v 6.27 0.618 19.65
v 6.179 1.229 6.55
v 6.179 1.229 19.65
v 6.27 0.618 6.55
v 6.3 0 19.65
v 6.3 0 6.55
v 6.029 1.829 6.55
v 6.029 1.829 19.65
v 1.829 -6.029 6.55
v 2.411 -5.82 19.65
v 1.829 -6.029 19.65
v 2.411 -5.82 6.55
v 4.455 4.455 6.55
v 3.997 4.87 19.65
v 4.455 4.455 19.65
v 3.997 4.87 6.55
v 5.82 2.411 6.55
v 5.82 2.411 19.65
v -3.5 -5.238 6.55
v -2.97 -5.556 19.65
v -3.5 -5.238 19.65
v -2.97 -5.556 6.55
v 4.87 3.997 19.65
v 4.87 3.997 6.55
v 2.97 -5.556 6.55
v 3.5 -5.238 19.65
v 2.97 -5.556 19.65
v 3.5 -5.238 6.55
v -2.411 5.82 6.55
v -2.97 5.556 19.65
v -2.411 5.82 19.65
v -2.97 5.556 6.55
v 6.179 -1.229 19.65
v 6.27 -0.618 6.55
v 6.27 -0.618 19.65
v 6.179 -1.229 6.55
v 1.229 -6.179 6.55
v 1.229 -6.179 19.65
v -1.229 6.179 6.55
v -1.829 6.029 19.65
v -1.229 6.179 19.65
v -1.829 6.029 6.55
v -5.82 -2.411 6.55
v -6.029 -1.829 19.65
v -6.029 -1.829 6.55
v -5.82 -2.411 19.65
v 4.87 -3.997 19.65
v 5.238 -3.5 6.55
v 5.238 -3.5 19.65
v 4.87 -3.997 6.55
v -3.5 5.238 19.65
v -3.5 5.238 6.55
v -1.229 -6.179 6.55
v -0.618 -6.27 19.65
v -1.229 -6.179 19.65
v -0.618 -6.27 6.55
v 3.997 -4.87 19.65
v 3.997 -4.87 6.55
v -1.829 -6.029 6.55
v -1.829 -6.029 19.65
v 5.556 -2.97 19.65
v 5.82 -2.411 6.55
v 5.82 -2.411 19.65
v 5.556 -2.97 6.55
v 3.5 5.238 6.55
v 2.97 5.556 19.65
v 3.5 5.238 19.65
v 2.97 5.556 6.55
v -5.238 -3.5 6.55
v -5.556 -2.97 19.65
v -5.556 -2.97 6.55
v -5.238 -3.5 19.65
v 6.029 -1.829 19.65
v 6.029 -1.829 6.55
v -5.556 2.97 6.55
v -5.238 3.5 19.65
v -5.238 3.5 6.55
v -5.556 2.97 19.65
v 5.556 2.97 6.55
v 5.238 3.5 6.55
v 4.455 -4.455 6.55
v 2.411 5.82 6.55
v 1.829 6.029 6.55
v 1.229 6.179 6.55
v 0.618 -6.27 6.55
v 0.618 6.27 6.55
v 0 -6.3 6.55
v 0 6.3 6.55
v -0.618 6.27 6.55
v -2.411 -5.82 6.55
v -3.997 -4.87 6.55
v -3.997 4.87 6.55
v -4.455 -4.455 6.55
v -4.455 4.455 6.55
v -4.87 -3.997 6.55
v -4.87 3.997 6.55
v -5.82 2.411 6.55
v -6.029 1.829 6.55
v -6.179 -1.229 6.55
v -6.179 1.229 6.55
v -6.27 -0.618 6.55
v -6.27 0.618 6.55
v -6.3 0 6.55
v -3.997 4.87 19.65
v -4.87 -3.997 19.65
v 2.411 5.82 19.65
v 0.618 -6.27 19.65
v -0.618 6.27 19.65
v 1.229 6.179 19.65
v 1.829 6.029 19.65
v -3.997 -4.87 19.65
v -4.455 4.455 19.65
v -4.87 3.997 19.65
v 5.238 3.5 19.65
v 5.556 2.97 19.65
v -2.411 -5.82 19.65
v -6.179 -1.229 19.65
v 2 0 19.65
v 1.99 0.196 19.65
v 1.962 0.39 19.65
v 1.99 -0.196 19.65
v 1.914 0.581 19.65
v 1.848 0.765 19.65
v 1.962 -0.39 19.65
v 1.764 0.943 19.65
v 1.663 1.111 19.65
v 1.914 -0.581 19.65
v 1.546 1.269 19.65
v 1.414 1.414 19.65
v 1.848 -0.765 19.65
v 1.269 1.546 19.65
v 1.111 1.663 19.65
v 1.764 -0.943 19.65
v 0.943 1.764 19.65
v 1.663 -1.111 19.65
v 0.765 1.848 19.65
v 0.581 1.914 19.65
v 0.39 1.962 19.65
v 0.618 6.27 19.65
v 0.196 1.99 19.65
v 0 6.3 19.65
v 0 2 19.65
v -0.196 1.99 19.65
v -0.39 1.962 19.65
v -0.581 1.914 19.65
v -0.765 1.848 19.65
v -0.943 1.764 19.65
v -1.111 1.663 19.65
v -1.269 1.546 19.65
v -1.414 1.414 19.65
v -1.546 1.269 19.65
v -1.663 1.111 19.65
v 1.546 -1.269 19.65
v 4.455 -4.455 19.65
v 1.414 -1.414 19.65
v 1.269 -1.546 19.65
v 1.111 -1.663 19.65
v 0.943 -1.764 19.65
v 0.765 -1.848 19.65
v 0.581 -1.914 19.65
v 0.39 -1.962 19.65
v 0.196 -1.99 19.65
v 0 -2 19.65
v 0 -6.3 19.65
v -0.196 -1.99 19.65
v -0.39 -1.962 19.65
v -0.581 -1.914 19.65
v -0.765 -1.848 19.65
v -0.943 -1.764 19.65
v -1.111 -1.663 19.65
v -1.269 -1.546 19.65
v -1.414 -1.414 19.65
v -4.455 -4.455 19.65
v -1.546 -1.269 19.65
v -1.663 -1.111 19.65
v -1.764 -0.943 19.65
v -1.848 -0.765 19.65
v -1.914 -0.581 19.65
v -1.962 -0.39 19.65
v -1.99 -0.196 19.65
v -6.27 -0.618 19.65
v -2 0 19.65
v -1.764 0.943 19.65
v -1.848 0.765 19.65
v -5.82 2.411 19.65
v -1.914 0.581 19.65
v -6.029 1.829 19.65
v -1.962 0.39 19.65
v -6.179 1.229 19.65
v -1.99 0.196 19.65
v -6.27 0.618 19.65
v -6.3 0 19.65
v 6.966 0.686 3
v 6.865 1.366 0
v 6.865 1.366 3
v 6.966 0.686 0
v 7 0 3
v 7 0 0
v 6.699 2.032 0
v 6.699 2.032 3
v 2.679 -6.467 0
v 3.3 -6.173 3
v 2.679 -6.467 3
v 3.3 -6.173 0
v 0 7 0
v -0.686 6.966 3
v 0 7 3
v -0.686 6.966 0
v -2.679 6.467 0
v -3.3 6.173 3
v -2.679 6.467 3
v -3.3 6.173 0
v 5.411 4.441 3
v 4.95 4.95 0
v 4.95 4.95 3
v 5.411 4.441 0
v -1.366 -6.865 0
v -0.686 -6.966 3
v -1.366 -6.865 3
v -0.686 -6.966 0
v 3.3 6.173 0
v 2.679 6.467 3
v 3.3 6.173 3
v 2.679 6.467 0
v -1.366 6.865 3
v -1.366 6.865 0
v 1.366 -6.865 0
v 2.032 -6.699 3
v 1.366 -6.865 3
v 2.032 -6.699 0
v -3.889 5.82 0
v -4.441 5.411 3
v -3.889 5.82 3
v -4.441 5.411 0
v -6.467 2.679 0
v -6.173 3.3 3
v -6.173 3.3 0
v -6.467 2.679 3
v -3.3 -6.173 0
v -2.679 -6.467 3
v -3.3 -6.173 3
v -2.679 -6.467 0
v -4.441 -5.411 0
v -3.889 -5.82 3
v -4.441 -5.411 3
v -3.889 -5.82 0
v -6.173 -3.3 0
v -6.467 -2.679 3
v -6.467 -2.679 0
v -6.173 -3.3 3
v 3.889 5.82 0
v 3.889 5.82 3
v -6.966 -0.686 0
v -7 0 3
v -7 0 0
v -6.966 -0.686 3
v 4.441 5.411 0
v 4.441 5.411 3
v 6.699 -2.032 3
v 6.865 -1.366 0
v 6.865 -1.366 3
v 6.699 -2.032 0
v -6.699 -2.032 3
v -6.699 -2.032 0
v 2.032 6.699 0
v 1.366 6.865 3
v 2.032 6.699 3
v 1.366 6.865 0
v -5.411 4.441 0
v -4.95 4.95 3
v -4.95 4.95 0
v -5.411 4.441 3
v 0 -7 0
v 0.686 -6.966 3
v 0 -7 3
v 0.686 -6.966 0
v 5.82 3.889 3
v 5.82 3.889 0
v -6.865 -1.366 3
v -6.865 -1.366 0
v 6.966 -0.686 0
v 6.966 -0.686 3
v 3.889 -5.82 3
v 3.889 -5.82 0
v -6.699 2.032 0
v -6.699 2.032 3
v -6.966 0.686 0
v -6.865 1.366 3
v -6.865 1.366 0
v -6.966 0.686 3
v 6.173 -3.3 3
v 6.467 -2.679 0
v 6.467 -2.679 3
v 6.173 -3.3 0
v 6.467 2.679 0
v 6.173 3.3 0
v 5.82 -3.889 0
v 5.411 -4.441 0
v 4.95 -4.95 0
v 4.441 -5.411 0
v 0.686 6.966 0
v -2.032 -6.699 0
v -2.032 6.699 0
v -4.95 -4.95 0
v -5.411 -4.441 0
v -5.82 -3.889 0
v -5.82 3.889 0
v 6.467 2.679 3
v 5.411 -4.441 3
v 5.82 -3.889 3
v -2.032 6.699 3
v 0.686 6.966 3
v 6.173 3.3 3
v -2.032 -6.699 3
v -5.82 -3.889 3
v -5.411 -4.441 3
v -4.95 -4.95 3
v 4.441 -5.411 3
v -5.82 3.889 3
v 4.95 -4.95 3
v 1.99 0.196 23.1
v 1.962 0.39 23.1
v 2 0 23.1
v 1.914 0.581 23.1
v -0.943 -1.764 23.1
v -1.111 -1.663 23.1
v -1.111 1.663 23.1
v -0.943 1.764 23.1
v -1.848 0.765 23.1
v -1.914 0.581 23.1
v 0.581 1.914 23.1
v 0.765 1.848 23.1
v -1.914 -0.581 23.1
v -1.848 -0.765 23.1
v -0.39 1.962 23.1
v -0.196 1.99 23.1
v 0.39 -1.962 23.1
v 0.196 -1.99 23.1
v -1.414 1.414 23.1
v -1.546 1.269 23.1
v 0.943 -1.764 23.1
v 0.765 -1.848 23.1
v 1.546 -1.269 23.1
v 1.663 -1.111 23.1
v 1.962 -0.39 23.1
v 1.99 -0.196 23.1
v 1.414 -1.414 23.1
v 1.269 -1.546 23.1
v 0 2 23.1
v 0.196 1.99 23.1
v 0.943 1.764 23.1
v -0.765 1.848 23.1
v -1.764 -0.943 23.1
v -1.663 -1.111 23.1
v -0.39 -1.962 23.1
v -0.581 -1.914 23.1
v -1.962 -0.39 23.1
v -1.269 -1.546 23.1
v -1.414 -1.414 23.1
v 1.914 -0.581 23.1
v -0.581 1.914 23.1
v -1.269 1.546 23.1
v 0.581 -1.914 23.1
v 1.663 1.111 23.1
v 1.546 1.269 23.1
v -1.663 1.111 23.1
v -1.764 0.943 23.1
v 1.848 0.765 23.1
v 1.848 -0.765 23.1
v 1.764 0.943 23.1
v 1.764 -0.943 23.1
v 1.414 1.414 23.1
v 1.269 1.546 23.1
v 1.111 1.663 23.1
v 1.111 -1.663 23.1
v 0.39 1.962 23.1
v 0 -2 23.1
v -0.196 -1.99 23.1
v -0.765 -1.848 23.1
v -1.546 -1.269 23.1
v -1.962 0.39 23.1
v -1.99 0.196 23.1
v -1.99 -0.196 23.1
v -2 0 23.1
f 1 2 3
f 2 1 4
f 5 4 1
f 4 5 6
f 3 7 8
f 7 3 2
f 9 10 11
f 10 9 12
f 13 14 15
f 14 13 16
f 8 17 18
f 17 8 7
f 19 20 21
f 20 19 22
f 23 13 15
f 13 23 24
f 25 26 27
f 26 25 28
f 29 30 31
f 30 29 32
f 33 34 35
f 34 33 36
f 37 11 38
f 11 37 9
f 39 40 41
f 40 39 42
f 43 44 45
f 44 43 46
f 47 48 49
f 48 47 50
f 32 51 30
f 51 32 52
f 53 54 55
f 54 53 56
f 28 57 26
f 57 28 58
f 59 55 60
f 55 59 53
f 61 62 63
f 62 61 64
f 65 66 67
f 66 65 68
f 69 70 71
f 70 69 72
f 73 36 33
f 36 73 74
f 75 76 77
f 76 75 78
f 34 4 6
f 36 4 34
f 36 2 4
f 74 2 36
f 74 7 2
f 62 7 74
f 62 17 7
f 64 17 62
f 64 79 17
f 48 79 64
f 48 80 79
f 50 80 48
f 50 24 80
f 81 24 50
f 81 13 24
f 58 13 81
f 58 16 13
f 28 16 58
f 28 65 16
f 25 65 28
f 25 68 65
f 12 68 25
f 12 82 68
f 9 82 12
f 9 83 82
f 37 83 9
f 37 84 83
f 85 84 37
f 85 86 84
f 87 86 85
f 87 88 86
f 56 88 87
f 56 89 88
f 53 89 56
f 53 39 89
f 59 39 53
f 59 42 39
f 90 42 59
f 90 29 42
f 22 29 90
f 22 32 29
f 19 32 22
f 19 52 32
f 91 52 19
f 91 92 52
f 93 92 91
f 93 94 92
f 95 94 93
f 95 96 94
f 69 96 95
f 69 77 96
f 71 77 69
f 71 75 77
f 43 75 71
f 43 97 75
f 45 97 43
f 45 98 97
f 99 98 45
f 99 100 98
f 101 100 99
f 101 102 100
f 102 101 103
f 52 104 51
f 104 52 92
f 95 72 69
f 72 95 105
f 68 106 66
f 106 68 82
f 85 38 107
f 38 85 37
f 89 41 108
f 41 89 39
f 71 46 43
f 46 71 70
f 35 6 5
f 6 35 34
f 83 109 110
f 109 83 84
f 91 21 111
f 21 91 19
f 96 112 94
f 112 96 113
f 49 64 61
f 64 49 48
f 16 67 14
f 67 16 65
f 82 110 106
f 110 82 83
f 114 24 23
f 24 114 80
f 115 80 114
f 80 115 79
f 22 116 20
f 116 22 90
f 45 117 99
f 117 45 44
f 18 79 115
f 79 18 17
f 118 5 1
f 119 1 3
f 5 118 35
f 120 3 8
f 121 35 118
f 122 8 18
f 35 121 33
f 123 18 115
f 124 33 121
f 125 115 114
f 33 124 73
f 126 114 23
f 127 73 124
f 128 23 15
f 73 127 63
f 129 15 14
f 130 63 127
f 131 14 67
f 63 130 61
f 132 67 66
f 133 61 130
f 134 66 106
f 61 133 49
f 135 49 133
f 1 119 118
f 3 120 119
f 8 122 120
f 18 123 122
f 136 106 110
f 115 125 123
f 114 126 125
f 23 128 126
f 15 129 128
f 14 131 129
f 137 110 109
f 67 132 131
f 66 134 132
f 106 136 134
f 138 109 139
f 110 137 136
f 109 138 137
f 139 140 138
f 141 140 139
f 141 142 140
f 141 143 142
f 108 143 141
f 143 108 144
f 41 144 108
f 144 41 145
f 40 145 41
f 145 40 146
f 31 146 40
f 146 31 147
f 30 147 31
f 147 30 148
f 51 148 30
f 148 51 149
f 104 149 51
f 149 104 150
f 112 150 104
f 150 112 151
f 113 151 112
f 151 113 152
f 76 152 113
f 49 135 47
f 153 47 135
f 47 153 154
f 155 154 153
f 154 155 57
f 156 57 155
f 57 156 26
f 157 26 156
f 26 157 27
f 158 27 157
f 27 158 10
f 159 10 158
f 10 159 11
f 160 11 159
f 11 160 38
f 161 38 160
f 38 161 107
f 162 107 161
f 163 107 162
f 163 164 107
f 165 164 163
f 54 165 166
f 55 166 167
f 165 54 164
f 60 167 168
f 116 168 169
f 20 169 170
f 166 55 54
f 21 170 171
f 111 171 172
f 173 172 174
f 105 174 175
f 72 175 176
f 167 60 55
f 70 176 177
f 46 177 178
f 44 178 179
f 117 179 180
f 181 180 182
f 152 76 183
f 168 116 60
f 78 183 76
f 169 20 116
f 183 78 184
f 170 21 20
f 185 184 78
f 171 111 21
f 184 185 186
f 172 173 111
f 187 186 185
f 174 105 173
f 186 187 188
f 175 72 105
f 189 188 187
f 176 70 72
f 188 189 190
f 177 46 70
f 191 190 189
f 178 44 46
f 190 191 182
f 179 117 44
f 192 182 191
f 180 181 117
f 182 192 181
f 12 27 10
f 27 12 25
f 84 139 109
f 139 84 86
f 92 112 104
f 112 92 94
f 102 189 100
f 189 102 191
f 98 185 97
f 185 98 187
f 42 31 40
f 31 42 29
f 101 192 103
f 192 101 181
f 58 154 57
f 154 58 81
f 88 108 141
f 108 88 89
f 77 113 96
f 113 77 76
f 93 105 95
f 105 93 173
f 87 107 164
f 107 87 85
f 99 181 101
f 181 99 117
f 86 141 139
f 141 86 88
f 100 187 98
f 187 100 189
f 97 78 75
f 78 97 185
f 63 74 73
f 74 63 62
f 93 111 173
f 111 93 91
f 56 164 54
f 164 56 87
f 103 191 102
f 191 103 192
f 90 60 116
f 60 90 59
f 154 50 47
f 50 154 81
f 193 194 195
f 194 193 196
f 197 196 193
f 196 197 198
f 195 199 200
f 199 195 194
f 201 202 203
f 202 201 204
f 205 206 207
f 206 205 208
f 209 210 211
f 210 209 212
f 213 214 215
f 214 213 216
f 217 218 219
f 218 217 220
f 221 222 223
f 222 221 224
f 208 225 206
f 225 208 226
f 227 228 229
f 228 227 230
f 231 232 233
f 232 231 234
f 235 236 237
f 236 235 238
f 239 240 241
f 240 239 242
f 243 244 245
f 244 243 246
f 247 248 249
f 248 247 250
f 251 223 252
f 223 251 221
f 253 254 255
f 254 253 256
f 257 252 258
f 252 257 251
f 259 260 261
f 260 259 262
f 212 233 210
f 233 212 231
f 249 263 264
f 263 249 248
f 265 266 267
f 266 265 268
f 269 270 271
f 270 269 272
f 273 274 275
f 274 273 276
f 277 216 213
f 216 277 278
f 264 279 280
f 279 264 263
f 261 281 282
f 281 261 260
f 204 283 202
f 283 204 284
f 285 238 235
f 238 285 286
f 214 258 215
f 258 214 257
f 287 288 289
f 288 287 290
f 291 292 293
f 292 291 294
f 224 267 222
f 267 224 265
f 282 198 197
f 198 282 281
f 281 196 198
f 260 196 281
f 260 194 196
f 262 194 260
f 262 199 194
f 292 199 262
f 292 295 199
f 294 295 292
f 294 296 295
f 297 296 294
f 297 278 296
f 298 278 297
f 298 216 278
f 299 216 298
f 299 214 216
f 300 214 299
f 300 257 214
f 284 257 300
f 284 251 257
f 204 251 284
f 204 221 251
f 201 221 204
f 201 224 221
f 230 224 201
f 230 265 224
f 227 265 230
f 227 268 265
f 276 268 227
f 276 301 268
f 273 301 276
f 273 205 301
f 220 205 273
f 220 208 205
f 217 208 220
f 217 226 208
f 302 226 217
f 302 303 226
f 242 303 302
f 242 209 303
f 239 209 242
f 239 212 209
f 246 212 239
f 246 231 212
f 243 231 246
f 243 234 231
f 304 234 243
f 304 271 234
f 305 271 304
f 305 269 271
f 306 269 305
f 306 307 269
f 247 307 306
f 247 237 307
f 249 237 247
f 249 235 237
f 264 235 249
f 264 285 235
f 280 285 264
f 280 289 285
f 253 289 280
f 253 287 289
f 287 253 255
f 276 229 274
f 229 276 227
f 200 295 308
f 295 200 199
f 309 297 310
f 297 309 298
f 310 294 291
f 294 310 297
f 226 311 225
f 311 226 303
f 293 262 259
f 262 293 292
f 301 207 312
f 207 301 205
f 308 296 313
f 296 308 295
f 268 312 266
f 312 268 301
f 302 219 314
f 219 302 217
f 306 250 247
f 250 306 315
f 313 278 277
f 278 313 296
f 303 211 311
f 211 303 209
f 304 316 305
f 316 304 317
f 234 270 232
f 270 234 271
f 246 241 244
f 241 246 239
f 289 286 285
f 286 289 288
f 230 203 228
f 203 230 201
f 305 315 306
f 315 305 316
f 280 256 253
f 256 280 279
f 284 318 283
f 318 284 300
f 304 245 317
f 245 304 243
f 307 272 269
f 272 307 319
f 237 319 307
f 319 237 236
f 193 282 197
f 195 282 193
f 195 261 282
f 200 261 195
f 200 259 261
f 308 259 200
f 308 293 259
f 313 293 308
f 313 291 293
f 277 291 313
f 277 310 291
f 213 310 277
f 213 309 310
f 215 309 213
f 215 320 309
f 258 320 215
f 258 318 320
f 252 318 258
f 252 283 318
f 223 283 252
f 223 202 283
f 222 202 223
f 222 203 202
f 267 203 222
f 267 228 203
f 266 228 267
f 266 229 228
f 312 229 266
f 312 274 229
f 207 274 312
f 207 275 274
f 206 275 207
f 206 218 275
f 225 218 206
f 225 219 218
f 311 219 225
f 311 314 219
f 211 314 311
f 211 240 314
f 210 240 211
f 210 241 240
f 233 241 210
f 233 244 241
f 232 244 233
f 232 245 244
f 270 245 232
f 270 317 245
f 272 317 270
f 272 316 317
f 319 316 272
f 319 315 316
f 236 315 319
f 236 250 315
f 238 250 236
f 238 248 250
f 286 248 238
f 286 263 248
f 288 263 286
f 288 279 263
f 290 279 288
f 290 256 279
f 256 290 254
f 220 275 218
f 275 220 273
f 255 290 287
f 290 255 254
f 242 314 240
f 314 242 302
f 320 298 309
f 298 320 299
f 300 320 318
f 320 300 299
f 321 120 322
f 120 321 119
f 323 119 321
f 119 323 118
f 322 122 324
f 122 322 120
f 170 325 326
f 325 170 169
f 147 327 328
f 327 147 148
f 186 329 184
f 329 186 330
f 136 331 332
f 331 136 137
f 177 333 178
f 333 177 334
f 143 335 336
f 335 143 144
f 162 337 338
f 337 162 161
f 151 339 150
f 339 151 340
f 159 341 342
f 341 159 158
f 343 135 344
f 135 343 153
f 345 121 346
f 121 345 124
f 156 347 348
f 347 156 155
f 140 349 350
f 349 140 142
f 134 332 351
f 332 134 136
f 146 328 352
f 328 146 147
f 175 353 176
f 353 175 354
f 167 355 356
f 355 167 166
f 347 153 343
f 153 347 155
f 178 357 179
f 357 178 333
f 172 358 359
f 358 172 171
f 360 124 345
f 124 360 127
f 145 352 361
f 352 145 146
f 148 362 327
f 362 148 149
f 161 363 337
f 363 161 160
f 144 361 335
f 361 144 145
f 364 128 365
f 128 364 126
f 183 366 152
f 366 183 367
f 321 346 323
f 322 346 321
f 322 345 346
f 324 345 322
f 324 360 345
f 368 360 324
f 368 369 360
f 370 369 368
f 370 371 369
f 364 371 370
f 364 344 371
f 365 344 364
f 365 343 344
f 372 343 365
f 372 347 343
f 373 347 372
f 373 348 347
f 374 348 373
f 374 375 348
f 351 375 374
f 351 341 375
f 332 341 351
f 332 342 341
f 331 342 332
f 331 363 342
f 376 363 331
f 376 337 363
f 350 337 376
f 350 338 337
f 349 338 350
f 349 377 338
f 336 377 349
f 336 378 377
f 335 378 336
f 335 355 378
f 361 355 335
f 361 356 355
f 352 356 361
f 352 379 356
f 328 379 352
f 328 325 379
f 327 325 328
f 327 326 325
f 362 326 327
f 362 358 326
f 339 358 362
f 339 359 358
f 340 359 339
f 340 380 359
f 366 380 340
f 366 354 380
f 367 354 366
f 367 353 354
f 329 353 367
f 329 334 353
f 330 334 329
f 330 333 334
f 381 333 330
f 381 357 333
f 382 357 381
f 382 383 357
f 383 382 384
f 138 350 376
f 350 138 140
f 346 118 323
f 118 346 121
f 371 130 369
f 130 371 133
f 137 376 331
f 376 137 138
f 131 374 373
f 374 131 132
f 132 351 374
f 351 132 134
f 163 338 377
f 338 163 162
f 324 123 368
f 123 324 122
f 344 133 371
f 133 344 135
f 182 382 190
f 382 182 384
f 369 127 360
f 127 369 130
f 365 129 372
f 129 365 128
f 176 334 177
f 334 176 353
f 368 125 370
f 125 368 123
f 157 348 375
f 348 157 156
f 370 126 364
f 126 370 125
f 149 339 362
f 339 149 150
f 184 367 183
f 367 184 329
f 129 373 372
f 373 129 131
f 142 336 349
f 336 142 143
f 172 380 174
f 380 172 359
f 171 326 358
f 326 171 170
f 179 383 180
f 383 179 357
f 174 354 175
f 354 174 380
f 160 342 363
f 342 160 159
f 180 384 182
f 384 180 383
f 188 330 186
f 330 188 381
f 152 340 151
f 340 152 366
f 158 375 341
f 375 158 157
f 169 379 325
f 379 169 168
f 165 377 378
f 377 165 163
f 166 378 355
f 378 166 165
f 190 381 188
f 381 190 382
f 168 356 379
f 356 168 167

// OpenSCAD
module toggle_switch() {
    union() {
        // Main body of the switch
        translate([0, 0, 6.55])
            cylinder(h=13.1, d=12.6, $fn=64);
        
        // Base of the switch
        translate([0, 0, 0])
            cylinder(h=3, d=14, $fn=64);
        
        // Toggle lever
        translate([0, 0, 13.1])
            cylinder(h=10, d=4, $fn=64);
    }
}

toggle_switch();
